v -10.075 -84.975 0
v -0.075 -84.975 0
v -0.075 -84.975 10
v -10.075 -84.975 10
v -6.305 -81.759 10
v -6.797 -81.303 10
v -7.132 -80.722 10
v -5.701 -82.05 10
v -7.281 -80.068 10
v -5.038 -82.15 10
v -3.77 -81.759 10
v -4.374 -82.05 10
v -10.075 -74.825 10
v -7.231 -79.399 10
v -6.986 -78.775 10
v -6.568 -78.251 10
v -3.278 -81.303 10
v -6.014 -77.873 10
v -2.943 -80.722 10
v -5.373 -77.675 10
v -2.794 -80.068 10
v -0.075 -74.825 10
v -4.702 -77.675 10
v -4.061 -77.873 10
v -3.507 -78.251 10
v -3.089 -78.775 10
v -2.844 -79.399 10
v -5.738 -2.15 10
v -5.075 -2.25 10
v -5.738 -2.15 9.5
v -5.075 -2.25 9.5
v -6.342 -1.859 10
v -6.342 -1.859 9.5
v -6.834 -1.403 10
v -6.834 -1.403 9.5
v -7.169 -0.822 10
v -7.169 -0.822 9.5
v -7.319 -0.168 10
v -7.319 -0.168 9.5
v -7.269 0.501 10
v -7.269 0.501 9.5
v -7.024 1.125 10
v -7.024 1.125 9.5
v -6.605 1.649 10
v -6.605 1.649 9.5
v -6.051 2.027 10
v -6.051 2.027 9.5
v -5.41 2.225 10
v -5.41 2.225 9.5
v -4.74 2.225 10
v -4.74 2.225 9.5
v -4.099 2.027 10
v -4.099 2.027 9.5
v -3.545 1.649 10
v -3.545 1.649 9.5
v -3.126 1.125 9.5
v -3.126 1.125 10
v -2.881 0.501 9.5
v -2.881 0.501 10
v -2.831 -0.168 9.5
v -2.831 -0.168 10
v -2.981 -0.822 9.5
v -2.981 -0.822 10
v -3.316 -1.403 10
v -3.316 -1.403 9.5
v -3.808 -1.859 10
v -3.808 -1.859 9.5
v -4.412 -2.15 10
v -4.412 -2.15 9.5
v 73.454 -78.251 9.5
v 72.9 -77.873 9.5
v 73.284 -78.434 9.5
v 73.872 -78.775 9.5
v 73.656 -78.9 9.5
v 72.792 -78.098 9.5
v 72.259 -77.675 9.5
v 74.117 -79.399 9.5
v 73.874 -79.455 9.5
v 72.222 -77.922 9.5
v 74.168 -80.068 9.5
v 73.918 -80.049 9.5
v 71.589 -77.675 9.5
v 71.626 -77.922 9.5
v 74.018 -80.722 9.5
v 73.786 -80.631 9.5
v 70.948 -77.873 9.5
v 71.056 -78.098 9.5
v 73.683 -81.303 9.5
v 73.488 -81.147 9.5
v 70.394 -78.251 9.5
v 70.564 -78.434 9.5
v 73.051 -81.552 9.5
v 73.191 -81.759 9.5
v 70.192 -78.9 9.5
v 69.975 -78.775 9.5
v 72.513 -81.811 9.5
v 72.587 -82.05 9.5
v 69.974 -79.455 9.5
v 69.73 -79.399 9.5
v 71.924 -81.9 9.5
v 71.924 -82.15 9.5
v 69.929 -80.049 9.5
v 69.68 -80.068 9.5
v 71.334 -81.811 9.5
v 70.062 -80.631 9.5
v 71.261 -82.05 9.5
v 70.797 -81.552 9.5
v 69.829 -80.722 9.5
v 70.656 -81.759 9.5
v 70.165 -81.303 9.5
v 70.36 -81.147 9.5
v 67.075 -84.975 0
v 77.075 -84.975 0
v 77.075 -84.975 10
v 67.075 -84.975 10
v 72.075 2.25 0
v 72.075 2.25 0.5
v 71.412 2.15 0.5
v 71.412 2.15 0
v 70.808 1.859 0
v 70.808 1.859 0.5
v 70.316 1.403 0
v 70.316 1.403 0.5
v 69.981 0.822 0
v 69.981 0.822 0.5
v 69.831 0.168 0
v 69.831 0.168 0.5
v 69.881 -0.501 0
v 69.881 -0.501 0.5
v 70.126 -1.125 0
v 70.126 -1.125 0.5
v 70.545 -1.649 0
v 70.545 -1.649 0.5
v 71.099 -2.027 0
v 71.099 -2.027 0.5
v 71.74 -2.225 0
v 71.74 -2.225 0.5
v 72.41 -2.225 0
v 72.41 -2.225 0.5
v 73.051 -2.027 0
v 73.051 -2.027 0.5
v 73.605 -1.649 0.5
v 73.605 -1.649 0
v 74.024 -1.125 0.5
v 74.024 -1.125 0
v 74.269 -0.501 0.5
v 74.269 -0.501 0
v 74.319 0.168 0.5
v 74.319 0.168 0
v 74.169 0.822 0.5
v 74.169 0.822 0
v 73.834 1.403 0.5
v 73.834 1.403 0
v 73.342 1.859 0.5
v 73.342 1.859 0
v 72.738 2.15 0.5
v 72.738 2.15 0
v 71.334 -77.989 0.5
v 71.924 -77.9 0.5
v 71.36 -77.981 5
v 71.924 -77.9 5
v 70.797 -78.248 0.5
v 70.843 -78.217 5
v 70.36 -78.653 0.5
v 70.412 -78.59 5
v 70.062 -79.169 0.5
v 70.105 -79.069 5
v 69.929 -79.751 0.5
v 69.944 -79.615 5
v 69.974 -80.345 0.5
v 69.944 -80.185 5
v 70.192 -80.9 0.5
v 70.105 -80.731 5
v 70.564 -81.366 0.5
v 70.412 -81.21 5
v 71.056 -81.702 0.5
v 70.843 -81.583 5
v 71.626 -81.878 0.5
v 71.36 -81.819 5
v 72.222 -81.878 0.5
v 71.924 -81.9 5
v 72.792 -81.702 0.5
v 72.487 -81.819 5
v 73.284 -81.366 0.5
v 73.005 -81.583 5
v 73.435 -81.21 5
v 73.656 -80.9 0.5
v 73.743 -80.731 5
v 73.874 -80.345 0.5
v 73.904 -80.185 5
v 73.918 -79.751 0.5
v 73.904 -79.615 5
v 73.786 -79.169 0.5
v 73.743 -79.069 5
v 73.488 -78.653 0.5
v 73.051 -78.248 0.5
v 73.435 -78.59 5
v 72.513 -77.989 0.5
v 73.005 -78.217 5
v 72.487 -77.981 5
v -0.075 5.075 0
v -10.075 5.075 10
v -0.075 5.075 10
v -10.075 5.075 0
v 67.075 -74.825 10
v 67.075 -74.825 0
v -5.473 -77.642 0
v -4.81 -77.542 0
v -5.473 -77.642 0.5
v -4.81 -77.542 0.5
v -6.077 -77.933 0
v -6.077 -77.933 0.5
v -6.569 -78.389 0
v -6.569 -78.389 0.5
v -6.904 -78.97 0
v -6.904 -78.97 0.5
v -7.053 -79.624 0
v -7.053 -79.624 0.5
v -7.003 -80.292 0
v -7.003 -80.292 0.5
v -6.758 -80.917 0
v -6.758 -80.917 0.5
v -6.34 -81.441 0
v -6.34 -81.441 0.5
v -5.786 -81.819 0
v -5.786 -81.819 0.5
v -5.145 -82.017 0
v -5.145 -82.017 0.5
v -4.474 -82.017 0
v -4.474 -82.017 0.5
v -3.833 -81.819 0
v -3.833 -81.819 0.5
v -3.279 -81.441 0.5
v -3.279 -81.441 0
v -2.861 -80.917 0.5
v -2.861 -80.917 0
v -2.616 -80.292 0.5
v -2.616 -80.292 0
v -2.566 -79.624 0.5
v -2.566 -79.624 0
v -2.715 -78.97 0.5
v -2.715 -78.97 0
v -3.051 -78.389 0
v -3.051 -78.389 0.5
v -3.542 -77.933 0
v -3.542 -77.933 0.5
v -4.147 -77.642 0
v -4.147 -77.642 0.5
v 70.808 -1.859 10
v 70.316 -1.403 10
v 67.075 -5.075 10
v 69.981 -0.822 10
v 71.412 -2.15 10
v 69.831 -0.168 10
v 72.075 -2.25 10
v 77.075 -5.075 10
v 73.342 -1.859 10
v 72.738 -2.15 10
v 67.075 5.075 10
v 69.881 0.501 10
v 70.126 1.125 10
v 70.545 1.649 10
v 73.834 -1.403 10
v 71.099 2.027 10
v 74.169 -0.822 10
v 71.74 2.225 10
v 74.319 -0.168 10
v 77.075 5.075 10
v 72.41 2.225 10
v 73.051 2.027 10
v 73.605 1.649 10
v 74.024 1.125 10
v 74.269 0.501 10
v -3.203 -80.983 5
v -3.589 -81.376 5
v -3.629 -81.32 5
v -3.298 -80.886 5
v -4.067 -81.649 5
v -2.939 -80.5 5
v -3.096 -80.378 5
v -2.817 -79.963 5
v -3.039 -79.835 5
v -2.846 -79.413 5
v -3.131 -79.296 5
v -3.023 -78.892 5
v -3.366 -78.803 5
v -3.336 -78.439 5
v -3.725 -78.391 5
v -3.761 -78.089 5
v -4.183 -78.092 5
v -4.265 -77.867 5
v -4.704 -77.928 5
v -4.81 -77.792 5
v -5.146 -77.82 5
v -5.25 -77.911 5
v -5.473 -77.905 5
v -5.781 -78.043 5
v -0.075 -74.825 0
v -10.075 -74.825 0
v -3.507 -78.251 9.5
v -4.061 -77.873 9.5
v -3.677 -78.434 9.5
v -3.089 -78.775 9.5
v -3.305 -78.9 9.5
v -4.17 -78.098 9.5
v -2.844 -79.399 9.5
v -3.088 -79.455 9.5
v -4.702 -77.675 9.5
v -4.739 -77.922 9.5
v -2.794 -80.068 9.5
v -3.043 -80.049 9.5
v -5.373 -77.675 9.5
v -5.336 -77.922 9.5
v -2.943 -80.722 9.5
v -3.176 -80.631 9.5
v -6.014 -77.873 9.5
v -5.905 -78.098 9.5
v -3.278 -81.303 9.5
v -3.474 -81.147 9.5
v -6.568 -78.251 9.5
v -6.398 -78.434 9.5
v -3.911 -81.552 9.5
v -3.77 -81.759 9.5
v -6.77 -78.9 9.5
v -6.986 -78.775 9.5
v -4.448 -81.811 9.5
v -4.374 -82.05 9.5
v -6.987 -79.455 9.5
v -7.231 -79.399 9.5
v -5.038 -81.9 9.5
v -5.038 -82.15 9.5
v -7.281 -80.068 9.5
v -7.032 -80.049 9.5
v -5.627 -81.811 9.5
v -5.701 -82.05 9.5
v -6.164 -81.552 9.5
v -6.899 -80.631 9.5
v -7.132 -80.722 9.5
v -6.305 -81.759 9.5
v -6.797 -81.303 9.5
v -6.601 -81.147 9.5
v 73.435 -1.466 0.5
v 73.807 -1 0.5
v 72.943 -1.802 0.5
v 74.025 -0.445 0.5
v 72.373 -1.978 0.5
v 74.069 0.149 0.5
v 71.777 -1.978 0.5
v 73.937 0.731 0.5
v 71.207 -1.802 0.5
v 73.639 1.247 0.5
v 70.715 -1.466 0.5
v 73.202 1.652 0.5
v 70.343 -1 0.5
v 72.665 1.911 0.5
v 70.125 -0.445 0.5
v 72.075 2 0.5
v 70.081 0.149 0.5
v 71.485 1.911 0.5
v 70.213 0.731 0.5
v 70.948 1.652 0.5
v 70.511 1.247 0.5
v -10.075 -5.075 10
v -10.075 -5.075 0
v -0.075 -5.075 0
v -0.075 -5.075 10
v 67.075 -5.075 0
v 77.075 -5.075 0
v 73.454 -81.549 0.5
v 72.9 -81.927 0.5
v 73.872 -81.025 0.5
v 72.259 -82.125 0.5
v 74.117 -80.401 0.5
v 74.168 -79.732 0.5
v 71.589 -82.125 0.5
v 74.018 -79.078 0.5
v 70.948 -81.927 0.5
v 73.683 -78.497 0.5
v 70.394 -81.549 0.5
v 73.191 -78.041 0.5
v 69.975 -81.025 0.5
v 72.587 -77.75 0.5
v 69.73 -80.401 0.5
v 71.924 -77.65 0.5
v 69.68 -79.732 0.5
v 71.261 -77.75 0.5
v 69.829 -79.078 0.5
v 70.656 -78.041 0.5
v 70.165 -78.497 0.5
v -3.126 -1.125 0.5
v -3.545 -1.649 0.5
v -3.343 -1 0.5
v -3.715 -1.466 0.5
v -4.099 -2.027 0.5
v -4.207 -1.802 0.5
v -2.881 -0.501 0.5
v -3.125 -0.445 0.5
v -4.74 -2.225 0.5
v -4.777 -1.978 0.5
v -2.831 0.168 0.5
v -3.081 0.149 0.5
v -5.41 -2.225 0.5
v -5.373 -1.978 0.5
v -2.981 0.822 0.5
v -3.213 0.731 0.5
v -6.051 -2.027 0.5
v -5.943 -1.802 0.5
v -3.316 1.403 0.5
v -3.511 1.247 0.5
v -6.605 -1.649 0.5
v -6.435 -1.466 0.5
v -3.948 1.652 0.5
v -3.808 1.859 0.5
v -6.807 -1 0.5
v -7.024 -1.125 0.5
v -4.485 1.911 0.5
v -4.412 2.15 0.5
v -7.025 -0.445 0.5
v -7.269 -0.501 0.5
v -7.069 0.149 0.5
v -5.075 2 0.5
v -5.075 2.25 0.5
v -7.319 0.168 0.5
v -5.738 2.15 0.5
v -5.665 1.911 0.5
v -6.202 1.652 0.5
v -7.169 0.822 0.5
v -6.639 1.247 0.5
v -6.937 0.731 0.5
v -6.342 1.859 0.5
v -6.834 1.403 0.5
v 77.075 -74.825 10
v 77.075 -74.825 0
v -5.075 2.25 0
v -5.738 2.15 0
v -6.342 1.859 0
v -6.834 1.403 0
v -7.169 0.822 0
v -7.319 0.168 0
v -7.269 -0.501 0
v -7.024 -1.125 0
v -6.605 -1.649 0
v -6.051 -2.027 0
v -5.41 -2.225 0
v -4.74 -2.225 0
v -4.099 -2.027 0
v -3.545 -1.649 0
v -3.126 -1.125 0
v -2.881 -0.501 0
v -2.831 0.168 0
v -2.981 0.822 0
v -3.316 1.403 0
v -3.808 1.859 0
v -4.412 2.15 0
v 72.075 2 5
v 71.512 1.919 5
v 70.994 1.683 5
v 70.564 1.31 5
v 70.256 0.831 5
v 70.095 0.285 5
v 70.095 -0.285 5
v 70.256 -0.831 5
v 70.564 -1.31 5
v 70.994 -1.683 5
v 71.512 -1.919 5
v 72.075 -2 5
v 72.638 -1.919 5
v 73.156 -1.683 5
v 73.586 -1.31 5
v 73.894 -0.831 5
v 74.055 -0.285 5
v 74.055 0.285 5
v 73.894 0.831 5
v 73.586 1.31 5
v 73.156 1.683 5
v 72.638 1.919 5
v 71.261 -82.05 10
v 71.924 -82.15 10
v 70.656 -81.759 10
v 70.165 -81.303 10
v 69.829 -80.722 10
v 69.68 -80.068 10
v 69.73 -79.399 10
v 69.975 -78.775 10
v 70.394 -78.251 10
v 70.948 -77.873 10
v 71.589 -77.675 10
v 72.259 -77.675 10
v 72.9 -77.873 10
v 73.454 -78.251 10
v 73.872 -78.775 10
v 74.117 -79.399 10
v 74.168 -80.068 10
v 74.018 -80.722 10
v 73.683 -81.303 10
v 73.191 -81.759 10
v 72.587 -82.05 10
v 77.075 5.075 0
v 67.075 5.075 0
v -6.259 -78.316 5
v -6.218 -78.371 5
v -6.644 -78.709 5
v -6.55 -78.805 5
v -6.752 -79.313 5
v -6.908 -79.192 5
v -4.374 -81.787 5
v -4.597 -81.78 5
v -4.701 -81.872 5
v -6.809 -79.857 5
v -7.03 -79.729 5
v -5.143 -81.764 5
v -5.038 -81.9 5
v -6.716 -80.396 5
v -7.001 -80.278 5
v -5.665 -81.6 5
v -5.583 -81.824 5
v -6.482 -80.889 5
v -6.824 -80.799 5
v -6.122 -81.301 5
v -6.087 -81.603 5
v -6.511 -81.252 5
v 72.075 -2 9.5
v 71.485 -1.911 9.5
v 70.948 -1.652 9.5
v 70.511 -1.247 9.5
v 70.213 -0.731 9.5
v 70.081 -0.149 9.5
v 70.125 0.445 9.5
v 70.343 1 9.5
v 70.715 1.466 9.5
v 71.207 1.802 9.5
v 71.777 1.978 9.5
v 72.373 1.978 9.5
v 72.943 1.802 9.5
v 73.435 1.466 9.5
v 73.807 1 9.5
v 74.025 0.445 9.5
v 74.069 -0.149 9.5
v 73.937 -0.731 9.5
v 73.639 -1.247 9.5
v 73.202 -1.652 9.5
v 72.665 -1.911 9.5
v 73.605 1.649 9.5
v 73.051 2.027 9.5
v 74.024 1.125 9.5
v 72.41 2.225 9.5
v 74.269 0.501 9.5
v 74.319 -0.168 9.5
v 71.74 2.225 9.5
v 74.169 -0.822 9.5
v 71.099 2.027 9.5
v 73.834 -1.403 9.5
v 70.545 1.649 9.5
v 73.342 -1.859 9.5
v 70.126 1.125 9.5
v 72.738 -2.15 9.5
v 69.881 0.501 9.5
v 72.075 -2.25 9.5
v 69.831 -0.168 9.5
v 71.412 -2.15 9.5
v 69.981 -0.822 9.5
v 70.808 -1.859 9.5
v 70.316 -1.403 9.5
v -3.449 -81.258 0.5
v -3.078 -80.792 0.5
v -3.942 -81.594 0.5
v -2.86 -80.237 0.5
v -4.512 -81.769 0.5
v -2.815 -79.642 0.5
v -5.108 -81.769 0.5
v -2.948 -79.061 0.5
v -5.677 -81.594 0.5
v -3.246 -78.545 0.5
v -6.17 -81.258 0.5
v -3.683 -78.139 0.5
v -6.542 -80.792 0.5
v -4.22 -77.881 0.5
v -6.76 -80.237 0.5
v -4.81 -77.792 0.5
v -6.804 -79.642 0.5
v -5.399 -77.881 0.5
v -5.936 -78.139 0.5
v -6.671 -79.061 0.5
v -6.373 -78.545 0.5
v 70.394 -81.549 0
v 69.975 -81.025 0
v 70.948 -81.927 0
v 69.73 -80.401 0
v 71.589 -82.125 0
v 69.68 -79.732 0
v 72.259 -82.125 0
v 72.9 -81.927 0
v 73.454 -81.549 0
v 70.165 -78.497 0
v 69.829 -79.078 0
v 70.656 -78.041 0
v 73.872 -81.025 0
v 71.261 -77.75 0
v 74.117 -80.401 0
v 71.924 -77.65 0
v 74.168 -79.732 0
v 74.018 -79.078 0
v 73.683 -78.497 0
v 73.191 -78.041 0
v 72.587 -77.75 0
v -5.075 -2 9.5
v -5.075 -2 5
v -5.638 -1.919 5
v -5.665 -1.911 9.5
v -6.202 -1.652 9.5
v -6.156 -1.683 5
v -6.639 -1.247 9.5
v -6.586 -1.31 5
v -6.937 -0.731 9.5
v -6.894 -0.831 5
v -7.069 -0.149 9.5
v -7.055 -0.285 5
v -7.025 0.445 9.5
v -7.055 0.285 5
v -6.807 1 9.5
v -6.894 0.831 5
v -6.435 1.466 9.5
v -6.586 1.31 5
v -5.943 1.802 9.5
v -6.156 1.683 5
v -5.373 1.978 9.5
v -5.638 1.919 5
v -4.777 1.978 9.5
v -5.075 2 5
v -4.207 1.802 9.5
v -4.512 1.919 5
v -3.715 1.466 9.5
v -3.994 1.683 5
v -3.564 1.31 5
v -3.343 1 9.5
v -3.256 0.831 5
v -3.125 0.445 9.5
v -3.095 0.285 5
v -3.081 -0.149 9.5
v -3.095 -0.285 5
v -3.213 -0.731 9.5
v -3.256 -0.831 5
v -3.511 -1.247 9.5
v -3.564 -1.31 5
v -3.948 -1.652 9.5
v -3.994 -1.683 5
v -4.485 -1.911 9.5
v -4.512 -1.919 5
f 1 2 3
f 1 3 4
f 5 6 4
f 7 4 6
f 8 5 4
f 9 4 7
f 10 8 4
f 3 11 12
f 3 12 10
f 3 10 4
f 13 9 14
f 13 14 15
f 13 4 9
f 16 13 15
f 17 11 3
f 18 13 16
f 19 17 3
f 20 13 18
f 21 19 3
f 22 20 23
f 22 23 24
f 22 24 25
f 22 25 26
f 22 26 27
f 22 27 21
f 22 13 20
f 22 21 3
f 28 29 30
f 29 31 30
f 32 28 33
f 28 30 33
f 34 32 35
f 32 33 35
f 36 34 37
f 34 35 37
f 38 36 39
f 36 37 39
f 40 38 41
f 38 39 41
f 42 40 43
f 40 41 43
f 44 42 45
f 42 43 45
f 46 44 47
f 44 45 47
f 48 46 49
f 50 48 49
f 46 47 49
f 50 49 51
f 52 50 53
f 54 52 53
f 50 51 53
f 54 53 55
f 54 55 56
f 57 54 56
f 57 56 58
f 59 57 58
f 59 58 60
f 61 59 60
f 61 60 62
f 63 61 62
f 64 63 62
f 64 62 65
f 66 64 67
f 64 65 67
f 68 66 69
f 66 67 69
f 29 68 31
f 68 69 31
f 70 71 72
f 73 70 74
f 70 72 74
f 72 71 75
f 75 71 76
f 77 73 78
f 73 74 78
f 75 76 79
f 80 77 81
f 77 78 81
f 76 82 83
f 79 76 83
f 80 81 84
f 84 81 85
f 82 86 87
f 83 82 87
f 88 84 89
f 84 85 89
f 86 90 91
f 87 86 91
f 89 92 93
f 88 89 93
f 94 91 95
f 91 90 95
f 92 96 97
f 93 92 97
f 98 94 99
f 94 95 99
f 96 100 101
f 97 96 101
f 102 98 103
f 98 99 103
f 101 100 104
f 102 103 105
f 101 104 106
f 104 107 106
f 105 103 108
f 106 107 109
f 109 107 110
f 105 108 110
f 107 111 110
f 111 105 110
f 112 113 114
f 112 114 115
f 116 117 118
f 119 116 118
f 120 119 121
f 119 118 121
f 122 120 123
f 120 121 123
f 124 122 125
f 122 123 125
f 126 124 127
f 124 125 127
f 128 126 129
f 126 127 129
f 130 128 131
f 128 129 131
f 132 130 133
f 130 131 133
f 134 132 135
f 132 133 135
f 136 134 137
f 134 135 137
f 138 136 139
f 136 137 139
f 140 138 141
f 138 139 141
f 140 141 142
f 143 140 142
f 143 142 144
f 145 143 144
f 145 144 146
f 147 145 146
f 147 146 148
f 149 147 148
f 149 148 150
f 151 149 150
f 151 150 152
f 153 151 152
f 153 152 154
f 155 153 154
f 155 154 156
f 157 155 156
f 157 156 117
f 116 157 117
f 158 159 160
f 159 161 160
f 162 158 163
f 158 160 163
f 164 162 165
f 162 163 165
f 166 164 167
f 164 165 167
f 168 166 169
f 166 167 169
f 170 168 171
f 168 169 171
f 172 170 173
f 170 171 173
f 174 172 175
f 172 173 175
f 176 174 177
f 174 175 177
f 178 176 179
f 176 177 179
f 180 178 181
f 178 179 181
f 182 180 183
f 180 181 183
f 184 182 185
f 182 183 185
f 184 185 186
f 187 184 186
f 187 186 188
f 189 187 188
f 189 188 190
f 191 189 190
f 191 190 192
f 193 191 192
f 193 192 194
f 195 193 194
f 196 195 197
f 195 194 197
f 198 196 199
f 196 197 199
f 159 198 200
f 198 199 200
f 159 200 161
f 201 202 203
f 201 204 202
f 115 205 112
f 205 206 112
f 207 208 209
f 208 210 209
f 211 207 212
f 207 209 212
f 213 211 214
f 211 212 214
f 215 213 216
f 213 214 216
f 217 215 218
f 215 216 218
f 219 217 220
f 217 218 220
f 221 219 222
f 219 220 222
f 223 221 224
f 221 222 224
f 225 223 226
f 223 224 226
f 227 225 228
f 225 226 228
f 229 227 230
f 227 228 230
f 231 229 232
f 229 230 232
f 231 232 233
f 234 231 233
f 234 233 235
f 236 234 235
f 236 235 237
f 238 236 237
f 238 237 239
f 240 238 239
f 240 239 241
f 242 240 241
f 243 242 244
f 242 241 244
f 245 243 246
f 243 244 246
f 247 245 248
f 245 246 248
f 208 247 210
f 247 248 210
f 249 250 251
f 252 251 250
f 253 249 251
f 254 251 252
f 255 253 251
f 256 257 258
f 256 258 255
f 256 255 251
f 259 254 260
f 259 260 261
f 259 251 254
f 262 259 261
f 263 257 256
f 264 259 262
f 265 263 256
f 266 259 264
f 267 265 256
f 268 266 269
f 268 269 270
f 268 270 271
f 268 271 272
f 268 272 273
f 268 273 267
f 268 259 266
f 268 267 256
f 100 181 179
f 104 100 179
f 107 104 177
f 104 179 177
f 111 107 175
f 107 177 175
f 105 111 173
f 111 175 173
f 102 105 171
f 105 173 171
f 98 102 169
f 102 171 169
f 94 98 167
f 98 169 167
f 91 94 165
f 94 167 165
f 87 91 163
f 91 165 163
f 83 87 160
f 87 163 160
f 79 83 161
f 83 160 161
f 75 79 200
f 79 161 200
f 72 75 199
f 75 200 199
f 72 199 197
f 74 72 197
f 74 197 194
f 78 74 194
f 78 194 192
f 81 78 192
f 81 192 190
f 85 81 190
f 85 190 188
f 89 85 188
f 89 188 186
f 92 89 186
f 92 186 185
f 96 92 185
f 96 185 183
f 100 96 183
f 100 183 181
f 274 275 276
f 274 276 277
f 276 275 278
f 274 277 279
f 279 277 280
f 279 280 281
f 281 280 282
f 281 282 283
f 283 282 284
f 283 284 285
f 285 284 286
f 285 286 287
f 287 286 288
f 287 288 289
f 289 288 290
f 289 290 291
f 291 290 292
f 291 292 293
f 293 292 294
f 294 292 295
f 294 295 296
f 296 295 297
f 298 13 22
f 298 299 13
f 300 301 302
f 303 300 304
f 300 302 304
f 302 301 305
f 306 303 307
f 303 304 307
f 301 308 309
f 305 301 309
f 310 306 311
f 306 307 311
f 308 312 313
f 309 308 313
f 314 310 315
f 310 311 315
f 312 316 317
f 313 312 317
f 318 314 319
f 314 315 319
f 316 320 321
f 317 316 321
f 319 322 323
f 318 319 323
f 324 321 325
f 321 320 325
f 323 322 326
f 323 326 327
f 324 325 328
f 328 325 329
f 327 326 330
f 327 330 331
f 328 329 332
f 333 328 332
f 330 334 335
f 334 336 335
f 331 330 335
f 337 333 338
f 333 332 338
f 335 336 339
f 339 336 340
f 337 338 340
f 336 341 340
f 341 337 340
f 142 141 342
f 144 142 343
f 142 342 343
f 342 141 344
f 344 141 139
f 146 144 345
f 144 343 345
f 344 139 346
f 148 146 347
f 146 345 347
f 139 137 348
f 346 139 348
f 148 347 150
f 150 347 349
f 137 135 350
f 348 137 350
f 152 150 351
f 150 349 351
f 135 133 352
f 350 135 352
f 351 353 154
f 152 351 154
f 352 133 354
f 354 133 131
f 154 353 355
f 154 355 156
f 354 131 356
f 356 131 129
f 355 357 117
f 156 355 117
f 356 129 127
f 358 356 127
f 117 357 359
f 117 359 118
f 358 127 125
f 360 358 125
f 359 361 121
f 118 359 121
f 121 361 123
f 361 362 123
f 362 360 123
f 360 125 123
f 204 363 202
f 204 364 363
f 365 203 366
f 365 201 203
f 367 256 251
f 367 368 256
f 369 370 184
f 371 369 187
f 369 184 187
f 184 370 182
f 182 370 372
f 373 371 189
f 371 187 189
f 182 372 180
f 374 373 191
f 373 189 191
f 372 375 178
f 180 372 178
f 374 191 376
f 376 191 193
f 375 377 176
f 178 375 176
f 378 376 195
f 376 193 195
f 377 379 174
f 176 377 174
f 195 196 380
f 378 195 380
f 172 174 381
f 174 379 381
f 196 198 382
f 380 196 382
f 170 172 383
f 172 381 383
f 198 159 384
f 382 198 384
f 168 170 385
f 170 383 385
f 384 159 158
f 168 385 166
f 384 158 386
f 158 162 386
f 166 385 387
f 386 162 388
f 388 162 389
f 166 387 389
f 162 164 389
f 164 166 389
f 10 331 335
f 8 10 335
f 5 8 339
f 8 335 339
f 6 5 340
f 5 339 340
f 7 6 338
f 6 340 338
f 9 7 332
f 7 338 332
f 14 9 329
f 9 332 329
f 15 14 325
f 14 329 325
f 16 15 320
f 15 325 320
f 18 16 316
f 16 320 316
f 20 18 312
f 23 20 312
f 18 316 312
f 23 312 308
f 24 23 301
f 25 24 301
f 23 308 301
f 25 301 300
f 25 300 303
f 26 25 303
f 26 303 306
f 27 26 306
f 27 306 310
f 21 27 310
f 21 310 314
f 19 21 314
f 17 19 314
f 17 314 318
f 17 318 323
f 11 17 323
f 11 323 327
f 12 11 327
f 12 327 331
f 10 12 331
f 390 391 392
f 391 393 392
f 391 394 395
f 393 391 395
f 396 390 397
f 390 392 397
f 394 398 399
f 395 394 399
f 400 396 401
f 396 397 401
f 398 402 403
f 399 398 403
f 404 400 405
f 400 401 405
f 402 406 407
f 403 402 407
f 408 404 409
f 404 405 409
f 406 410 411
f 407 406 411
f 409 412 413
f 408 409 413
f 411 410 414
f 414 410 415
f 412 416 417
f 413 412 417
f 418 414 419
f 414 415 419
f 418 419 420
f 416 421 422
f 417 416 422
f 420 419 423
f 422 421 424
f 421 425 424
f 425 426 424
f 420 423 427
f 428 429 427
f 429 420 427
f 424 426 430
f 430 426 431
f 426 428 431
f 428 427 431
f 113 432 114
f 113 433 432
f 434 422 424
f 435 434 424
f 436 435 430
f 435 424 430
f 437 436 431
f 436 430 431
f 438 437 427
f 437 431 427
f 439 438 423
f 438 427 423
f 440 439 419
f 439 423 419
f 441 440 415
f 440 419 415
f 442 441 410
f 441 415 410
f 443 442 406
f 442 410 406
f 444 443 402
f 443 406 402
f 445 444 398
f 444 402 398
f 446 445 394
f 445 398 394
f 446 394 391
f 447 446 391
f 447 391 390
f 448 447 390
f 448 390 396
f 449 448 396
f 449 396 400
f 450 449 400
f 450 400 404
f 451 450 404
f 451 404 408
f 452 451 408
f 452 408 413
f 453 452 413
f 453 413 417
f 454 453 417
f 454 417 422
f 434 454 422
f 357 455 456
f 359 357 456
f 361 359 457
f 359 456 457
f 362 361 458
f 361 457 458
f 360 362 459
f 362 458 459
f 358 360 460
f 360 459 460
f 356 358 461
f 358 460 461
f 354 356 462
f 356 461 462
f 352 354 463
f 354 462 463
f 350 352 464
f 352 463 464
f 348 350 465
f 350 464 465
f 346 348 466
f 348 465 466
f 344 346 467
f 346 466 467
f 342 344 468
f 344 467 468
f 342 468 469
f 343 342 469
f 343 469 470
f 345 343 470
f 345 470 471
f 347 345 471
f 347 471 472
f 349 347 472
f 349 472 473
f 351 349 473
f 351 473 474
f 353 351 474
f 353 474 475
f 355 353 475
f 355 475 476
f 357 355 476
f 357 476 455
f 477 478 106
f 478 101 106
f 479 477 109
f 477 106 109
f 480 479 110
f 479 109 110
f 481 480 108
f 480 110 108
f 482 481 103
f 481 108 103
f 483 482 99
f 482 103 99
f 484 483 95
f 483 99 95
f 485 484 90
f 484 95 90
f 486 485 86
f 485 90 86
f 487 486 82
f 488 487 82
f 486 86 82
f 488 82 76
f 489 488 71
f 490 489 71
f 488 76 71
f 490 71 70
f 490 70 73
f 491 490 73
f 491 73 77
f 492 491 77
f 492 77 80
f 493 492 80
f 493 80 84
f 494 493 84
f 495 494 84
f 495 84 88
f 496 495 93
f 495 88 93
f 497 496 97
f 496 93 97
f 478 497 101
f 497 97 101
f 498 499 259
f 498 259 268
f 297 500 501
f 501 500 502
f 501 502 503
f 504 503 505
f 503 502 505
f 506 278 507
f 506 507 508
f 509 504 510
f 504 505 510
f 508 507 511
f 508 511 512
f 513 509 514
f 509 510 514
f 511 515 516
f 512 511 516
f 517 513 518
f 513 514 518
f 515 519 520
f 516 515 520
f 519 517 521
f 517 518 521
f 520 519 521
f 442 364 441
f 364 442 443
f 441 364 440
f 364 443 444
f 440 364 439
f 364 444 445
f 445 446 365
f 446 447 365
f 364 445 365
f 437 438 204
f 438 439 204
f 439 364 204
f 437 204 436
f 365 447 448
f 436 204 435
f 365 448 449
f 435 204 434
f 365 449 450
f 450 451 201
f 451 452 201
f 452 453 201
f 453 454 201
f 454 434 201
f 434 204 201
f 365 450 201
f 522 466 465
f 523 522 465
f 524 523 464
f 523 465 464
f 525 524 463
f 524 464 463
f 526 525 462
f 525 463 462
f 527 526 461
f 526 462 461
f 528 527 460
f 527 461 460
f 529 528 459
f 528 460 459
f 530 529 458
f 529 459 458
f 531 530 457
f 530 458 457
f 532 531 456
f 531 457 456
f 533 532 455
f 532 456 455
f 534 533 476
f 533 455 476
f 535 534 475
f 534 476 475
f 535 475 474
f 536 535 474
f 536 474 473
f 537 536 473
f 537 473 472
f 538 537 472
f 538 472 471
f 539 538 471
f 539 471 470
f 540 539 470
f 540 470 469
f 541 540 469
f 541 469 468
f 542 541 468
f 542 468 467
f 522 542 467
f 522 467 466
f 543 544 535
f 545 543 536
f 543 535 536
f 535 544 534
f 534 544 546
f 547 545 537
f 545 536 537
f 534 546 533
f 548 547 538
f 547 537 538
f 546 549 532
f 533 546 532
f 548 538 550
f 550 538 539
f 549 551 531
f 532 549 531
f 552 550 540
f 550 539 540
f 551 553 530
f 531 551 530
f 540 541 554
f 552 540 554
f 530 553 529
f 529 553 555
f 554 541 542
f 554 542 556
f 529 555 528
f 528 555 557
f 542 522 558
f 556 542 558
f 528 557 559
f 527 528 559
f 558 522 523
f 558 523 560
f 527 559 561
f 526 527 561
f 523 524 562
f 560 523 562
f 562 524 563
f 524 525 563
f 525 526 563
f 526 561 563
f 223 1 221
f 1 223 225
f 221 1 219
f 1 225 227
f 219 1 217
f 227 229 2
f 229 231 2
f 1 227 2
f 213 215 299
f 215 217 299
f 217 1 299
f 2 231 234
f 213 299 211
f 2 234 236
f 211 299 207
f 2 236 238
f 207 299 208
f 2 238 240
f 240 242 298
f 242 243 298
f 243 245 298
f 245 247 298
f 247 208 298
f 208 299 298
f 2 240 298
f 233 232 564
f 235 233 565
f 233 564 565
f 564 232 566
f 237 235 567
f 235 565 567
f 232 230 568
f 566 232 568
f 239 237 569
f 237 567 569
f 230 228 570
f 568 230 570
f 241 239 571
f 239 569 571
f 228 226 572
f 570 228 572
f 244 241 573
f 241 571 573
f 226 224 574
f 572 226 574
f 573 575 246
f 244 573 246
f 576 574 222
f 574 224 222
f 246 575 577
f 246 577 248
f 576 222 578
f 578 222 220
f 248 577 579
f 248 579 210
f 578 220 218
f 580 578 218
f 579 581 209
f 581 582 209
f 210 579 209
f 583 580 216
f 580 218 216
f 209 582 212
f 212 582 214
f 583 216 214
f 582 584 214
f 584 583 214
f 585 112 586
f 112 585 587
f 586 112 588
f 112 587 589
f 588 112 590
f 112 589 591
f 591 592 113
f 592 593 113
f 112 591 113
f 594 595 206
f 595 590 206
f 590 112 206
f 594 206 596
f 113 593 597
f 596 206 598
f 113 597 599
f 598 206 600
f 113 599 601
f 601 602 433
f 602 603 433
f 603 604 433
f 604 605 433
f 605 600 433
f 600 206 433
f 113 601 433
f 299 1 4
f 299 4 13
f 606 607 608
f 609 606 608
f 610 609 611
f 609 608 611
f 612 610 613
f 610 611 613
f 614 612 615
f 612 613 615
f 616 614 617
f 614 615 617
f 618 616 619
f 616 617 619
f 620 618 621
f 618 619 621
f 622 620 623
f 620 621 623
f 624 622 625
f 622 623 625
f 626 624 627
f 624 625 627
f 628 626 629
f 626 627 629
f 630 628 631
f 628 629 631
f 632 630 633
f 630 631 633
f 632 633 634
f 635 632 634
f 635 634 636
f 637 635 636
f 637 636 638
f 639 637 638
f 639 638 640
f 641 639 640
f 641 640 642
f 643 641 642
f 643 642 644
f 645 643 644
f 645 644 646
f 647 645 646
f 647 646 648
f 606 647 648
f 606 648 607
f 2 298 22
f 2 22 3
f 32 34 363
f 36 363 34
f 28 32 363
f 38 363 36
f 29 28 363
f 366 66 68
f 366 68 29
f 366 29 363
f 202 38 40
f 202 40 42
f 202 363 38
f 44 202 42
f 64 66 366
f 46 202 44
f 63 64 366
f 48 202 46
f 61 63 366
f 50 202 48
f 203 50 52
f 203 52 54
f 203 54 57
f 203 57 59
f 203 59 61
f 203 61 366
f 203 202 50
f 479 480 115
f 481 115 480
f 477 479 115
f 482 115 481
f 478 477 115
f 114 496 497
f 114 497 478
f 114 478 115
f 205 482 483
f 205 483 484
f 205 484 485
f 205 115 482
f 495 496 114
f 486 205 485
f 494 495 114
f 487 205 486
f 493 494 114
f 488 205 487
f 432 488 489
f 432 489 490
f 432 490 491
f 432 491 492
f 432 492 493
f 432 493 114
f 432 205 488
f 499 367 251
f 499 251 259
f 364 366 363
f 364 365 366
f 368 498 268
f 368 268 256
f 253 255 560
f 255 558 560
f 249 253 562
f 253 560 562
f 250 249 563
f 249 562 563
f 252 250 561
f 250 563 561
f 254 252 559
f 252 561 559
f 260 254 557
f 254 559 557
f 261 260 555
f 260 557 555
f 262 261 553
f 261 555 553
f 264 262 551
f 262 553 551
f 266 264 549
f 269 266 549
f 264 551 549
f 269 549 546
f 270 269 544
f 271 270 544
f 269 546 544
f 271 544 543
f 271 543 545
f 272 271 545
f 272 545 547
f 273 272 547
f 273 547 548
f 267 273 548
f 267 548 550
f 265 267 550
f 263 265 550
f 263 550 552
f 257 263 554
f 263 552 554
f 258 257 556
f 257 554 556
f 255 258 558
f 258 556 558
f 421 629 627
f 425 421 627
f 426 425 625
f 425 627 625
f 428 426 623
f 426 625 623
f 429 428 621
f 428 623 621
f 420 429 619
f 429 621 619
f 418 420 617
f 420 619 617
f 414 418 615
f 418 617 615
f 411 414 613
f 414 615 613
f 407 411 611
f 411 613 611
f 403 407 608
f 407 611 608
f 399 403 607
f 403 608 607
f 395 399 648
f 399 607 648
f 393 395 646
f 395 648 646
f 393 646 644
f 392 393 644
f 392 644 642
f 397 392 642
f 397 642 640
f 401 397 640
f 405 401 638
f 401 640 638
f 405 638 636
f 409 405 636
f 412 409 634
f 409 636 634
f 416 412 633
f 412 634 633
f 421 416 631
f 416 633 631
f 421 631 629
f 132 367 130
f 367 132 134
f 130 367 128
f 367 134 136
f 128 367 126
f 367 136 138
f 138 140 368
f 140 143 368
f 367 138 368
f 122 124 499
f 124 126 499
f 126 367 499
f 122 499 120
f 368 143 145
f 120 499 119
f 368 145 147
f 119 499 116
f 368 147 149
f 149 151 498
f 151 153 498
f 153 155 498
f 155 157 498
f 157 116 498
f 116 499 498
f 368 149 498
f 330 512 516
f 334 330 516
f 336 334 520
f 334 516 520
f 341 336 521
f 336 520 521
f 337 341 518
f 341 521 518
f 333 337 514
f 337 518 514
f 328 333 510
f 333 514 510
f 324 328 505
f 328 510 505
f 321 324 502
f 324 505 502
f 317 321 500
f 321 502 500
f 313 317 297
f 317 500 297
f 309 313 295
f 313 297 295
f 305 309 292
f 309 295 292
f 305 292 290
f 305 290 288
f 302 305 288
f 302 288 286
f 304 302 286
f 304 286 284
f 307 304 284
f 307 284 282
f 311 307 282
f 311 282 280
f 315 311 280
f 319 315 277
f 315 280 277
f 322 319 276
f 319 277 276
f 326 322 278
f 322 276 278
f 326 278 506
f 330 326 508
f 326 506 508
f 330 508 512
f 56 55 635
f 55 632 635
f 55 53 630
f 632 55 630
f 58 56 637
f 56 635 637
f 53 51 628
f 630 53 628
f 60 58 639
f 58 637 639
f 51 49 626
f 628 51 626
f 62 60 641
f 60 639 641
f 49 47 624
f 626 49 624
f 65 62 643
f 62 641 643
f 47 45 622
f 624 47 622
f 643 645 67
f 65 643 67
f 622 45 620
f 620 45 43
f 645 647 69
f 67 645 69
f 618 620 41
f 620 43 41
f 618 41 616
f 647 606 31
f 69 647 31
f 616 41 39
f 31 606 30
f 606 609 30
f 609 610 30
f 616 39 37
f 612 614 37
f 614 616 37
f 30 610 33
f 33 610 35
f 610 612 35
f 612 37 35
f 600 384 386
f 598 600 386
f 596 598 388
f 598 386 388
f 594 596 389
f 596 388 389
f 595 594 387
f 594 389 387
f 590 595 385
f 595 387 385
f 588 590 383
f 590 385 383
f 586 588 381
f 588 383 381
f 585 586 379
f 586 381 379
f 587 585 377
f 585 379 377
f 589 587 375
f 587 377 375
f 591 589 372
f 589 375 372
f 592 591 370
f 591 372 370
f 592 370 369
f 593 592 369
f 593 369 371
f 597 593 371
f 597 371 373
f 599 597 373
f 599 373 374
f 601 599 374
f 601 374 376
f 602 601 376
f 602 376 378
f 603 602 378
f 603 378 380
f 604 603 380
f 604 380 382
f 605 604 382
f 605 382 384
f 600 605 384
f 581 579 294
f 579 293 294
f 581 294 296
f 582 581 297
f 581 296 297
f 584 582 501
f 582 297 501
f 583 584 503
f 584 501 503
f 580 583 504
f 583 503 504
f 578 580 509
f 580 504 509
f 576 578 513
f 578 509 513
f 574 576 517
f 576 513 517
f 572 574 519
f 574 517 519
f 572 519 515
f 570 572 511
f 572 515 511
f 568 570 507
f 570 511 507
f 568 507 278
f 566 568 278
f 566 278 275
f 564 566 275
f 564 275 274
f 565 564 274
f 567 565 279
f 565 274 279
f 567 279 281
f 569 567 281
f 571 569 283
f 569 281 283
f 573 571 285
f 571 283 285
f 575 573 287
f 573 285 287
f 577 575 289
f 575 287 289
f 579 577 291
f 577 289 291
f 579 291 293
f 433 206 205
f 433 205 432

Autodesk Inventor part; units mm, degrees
ref_plane "YZ Plane" through (0, 0, 0) normal (1, 0, 0) x (0, 1, 0)
ref_plane "XZ Plane" through (0, 0, 0) normal (0, 1, 0) x (-1, 0, 0)
ref_plane "XY Plane" through (0, 0, 0) normal (0, 0, 1) x (1, 0, 0)
sketch "Sketch1" plane through (0, 0, 0) normal (0, 0, 1) x (1, 0, 0)
  circle A0 centre (-5.1878, 0) radius 1.8 projected
  line L0 (-10.075, 5.075) -> (10.075, 5.075) projected
  line L1 (-10.075, -5.075) -> (-10.075, 5.075) projected
  line L2 (10.075, -5.075) -> (-10.075, -5.075) projected
  line L3 (10.075, 5.075) -> (10.075, -5.075) projected
  circle A1 centre (71.9239, 0) radius 1.8 projected
  line L4 (56.925, -5.075) -> (56.925, 5.075) projected
  line L5 (77.075, -5.075) -> (56.925, -5.075) projected
  line L6 (77.075, 5.075) -> (77.075, -5.075) projected
  line L7 (56.925, 5.075) -> (77.075, 5.075) projected
  circle A2 centre (72.075, -79.9) radius 1.8 projected
  line L8 (77.075, -84.975) -> (56.925, -84.975) projected
  line L9 (77.075, -74.825) -> (77.075, -84.975) projected
  line L10 (56.925, -74.825) -> (77.075, -74.825) projected
  line L11 (56.925, -84.975) -> (56.925, -74.825) projected
  circle A3 centre (-4.8097, -79.7917) radius 1.8 projected
  line L12 (-10.075, -74.825) -> (10.075, -74.825) projected
  line L13 (-10.075, -84.975) -> (-10.075, -74.825) projected
  line L14 (10.075, -84.975) -> (-10.075, -84.975) projected
  line L15 (10.075, -74.825) -> (10.075, -84.975) projected
  line L16 (-10.075, 5.075) -> (-0.075, 5.075)
  line L17 (-0.075, 5.075) -> (-0.075, -5.075)
  line L18 (-0.075, -5.075) -> (-10.075, -5.075)
  line L19 (-10.075, -5.075) -> (-10.075, 5.075)
  line L20 (-10.075, -74.825) -> (-0.075, -74.825)
  line L21 (-0.075, -74.825) -> (-0.075, -84.975)
  line L22 (-0.075, -84.975) -> (-10.075, -84.975)
  line L23 (-10.075, -84.975) -> (-10.075, -74.825)
  line L24 (77.075, -74.825) -> (67.075, -74.825)
  line L25 (67.075, -74.825) -> (67.075, -84.975)
  line L26 (67.075, -84.975) -> (77.075, -84.975)
  line L27 (77.075, -84.975) -> (77.075, -74.825)
  line L28 (77.075, -5.075) -> (67.075, -5.075)
  line L29 (67.075, -5.075) -> (67.075, 5.075)
  line L30 (67.075, 5.075) -> (77.075, 5.075)
  line L31 (77.075, 5.075) -> (77.075, -5.075)
  circle A4 centre (5, 0) radius 2.575 projected
  circle A5 centre (5, -79.9) radius 2.575 projected
  circle A6 centre (62, -79.9) radius 2.575 projected
  circle A7 centre (62, 0) radius 2.575 projected
  point P0 (0, 0)
  point P1 (-0.075, -74.825)
  point P2 (67.075, -74.825)
  point P3 (67.075, -5.075)
  point P4 (-0.075, 5.075)
  point P5 (7.4746, 0.7121)
  point P6 (2.5254, 0.7121)
  point P7 (-0.075, 5.075)
  point P8 (64.4746, -79.1879)
  point P9 (59.5254, -79.1879)
  point P10 (7.4746, -79.1879)
  point P11 (2.5254, -79.1879)
  point P12 (-0.075, -74.825)
  point P13 (64.4746, 0.7121)
  point P14 (59.5254, 0.7121)
  dimension "d0" = 10
  dimension "d1" = 10
  dimension "d2" = 10
  dimension "d3" = 10
extrude "Extrusion1" add sketch "Sketch1" along normal blind 10 contours A0 | L0 L17 L2 L1 | A1 | L29 L7 L6 L5 | A2 | L8 L25 L10 L9 | A3 | L12 L21 L14 L13
sketch "Sketch2" plane through (0, 0, 10) normal (0, 0, 1) x (1, 0, 0)
  line L0 (-0.075, 5.075) -> (-10.075, 5.075) projected
  line L1 (-10.075, -5.075) -> (-0.075, -5.075) projected
  line L2 (67.075, -5.075) -> (77.075, -5.075) projected
  line L3 (77.075, -5.075) -> (77.075, 5.075) projected
  line L4 (77.075, 5.075) -> (67.075, 5.075) projected
  line L5 (67.075, 5.075) -> (67.075, -5.075) projected
  line L6 (67.075, -84.975) -> (77.075, -84.975) projected
  line L7 (77.075, -84.975) -> (77.075, -74.825) projected
  line L8 (77.075, -74.825) -> (67.075, -74.825) projected
  line L9 (67.075, -74.825) -> (67.075, -84.975) projected
  line L10 (-0.075, -74.825) -> (-10.075, -74.825) projected
  line L11 (-10.075, -84.975) -> (-0.075, -84.975) projected
  line L12 (-10.075, 5.075) -> (-0.075, 5.075)
  line L13 (-10.075, -5.075) -> (-0.075, 5.075)
  line L14 (77.075, 5.075) -> (67.075, 5.075) projected
  line L15 (67.075, 5.075) -> (77.075, -5.075)
  line L16 (77.075, -74.825) -> (66.7728, -84.975)
  line L17 (-10.075, -74.825) -> (-10.075, -84.975) projected
  line L18 (-10.075, 5.075) -> (-10.075, -5.075) projected
  line L19 (-0.075, -84.975) -> (-0.075, -74.825) projected
  line L20 (-0.075, -5.075) -> (-0.075, 5.075) projected
  line L21 (-10.075, -74.825) -> (0, -84.975)
  point P0 (0, 0)
  point P1 (-5.075, 0)
  point P2 (72.075, 0)
  point P3 (71.9239, -79.9)
  point P4 (-5.0375, -79.9)
hole "Hole1" at (72.075, 0, 10) at (71.9239, -79.9, 10) at (-5.0375, -79.9, 10) at (-5.075, 0, 10) direction (0, 0, -1) diameter 4 depth 5 counterbore diameter 4.5 counterbore depth 0.5
sketch "Sketch3" plane through (0, 0, 0) normal (0, 0, -1) x (-1, 0, 0)
  circle A0 centre (-71.9239, 0) radius 1.8 projected
  circle A1 centre (5.1878, 0) radius 1.8 projected
  circle A2 centre (4.8097, -79.7917) radius 1.8 projected
  circle A3 centre (-72.075, -79.9) radius 1.8 projected
  circle A4 centre (-72.075, 0) radius 2 projected
  circle A5 centre (5.075, 0) radius 2.25 projected
  circle A6 centre (-71.9239, -79.9) radius 2 projected
  point P0 (0, 0)
  point P1 (9.9362, -74.825)
  point P2 (3.0375, -79.9)
hole "Hole2" at (72.075, 0, 0) at (-5.075, 0, 0) at (71.9239, -79.9, 0) at (-4.8097, -79.7917, 0) direction (0, 0, 1) diameter 4 depth 5 counterbore diameter 4.5 counterbore depth 0.5
properties part number "bms_hold_2"
